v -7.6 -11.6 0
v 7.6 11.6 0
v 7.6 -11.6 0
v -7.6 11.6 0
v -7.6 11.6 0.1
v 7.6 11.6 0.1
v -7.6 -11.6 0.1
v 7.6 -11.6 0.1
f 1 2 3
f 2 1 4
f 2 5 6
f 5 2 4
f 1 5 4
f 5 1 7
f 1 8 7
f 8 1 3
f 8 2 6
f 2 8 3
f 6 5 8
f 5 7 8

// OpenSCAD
// file: ../p/box5-12.scad
use <../lib.scad>
function ldraw_lib__box5_12() = [
// 0 Box with 5 Faces without Any Edges
// 0 Name: box5-12.dat
// 0 Author: Chris Dee [cwdee]
// 0 !LDRAW_ORG Primitive UPDATE 2009-02
// 0 !LICENSE Licensed under CC BY 2.0 and CC BY 4.0 : see CAreadme.txt
// 
// 0 BFC CERTIFY CCW
  [0,"BFC","CERTIFY"],
  [0,"BFC","CCW"],
// 
// 0 !HISTORY 2009-09-03 [PTadmin] Official Update 2009-02
// 
// 
// 4 16 1 1 1 1 1 -1 -1 1 -1 -1 1 1
  [4,16,1,1,1,1,1,-1,-1,1,-1,-1,1,1],
// 4 16 -1 0 1 1 0 1 1 1 1 -1 1 1
  [4,16,-1,0,1,1,0,1,1,1,1,-1,1,1],
// 4 16 -1 0 -1 -1 0 1 -1 1 1 -1 1 -1
  [4,16,-1,0,-1,-1,0,1,-1,1,1,-1,1,-1],
// 4 16 1 0 -1 -1 0 -1 -1 1 -1 1 1 -1
  [4,16,1,0,-1,-1,0,-1,-1,1,-1,1,1,-1],
// 4 16 1 0 1 1 0 -1 1 1 -1 1 1 1
  [4,16,1,0,1,1,0,-1,1,1,-1,1,1,1],
// 0
];
module ldraw_lib__box5_12(step=0, col=false, unit=2/5, alt=false, line=0.2, solid=!$preview)
    makepoly(ldraw_lib__box5_12(), step=step, col=col, unit=unit, alt=alt, line=line, solid=solid);
ldraw_lib__box5_12(line=0.2);
// main file
use <../lib.scad>
use <../p/box5-12.scad>
function ldraw_lib__6279911i() = [
// 0 Sticker  2.9 x  1.9 with Black and Chrome Gold Triangles
// 0 Name: 6279911i.dat
// 0 Author: Jaco van der Molen [Jaco]
// 0 !LDRAW_ORG Part UPDATE 2019-03
// 0 !LICENSE Licensed under CC BY 2.0 and CC BY 4.0 : see CAreadme.txt
// 
// 0 BFC CERTIFY CCW
  [0,"BFC","CERTIFY"],
  [0,"BFC","CCW"],
// 
// 0 !KEYWORDS Apollo 11, Lunar Lander, NASA, set 10266
// 
// 0 !HISTORY 2019-12-27 [PTadmin] Official Update 2019-03
// 
// 
// 1 16 0 -0.25 0 19 0 0 0 0.25 0 0 0 29 box5-12.dat
  [1,16,0,-0.25,0,19,0,0,0,0.25,0,0,0,29, ldraw_lib__box5_12()],
// 3 0 19 -0.25 29 -19 -0.25 29 19 -0.25 -29
  [3,0,19,-0.25,29,-19,-0.25,29,19,-0.25,-29],
// 3 334 -19 -0.25 29 -19 -0.25 -29 19 -0.25 -29
  [3,334,-19,-0.25,29,-19,-0.25,-29,19,-0.25,-29],
];
module ldraw_lib__6279911i(step=0, col=false, unit=2/5, alt=false, line=0.2, solid=!$preview)
    makepoly(ldraw_lib__6279911i(), step=step, col=col, unit=unit, alt=alt, line=line, solid=solid);
ldraw_lib__6279911i(line=0.2);
